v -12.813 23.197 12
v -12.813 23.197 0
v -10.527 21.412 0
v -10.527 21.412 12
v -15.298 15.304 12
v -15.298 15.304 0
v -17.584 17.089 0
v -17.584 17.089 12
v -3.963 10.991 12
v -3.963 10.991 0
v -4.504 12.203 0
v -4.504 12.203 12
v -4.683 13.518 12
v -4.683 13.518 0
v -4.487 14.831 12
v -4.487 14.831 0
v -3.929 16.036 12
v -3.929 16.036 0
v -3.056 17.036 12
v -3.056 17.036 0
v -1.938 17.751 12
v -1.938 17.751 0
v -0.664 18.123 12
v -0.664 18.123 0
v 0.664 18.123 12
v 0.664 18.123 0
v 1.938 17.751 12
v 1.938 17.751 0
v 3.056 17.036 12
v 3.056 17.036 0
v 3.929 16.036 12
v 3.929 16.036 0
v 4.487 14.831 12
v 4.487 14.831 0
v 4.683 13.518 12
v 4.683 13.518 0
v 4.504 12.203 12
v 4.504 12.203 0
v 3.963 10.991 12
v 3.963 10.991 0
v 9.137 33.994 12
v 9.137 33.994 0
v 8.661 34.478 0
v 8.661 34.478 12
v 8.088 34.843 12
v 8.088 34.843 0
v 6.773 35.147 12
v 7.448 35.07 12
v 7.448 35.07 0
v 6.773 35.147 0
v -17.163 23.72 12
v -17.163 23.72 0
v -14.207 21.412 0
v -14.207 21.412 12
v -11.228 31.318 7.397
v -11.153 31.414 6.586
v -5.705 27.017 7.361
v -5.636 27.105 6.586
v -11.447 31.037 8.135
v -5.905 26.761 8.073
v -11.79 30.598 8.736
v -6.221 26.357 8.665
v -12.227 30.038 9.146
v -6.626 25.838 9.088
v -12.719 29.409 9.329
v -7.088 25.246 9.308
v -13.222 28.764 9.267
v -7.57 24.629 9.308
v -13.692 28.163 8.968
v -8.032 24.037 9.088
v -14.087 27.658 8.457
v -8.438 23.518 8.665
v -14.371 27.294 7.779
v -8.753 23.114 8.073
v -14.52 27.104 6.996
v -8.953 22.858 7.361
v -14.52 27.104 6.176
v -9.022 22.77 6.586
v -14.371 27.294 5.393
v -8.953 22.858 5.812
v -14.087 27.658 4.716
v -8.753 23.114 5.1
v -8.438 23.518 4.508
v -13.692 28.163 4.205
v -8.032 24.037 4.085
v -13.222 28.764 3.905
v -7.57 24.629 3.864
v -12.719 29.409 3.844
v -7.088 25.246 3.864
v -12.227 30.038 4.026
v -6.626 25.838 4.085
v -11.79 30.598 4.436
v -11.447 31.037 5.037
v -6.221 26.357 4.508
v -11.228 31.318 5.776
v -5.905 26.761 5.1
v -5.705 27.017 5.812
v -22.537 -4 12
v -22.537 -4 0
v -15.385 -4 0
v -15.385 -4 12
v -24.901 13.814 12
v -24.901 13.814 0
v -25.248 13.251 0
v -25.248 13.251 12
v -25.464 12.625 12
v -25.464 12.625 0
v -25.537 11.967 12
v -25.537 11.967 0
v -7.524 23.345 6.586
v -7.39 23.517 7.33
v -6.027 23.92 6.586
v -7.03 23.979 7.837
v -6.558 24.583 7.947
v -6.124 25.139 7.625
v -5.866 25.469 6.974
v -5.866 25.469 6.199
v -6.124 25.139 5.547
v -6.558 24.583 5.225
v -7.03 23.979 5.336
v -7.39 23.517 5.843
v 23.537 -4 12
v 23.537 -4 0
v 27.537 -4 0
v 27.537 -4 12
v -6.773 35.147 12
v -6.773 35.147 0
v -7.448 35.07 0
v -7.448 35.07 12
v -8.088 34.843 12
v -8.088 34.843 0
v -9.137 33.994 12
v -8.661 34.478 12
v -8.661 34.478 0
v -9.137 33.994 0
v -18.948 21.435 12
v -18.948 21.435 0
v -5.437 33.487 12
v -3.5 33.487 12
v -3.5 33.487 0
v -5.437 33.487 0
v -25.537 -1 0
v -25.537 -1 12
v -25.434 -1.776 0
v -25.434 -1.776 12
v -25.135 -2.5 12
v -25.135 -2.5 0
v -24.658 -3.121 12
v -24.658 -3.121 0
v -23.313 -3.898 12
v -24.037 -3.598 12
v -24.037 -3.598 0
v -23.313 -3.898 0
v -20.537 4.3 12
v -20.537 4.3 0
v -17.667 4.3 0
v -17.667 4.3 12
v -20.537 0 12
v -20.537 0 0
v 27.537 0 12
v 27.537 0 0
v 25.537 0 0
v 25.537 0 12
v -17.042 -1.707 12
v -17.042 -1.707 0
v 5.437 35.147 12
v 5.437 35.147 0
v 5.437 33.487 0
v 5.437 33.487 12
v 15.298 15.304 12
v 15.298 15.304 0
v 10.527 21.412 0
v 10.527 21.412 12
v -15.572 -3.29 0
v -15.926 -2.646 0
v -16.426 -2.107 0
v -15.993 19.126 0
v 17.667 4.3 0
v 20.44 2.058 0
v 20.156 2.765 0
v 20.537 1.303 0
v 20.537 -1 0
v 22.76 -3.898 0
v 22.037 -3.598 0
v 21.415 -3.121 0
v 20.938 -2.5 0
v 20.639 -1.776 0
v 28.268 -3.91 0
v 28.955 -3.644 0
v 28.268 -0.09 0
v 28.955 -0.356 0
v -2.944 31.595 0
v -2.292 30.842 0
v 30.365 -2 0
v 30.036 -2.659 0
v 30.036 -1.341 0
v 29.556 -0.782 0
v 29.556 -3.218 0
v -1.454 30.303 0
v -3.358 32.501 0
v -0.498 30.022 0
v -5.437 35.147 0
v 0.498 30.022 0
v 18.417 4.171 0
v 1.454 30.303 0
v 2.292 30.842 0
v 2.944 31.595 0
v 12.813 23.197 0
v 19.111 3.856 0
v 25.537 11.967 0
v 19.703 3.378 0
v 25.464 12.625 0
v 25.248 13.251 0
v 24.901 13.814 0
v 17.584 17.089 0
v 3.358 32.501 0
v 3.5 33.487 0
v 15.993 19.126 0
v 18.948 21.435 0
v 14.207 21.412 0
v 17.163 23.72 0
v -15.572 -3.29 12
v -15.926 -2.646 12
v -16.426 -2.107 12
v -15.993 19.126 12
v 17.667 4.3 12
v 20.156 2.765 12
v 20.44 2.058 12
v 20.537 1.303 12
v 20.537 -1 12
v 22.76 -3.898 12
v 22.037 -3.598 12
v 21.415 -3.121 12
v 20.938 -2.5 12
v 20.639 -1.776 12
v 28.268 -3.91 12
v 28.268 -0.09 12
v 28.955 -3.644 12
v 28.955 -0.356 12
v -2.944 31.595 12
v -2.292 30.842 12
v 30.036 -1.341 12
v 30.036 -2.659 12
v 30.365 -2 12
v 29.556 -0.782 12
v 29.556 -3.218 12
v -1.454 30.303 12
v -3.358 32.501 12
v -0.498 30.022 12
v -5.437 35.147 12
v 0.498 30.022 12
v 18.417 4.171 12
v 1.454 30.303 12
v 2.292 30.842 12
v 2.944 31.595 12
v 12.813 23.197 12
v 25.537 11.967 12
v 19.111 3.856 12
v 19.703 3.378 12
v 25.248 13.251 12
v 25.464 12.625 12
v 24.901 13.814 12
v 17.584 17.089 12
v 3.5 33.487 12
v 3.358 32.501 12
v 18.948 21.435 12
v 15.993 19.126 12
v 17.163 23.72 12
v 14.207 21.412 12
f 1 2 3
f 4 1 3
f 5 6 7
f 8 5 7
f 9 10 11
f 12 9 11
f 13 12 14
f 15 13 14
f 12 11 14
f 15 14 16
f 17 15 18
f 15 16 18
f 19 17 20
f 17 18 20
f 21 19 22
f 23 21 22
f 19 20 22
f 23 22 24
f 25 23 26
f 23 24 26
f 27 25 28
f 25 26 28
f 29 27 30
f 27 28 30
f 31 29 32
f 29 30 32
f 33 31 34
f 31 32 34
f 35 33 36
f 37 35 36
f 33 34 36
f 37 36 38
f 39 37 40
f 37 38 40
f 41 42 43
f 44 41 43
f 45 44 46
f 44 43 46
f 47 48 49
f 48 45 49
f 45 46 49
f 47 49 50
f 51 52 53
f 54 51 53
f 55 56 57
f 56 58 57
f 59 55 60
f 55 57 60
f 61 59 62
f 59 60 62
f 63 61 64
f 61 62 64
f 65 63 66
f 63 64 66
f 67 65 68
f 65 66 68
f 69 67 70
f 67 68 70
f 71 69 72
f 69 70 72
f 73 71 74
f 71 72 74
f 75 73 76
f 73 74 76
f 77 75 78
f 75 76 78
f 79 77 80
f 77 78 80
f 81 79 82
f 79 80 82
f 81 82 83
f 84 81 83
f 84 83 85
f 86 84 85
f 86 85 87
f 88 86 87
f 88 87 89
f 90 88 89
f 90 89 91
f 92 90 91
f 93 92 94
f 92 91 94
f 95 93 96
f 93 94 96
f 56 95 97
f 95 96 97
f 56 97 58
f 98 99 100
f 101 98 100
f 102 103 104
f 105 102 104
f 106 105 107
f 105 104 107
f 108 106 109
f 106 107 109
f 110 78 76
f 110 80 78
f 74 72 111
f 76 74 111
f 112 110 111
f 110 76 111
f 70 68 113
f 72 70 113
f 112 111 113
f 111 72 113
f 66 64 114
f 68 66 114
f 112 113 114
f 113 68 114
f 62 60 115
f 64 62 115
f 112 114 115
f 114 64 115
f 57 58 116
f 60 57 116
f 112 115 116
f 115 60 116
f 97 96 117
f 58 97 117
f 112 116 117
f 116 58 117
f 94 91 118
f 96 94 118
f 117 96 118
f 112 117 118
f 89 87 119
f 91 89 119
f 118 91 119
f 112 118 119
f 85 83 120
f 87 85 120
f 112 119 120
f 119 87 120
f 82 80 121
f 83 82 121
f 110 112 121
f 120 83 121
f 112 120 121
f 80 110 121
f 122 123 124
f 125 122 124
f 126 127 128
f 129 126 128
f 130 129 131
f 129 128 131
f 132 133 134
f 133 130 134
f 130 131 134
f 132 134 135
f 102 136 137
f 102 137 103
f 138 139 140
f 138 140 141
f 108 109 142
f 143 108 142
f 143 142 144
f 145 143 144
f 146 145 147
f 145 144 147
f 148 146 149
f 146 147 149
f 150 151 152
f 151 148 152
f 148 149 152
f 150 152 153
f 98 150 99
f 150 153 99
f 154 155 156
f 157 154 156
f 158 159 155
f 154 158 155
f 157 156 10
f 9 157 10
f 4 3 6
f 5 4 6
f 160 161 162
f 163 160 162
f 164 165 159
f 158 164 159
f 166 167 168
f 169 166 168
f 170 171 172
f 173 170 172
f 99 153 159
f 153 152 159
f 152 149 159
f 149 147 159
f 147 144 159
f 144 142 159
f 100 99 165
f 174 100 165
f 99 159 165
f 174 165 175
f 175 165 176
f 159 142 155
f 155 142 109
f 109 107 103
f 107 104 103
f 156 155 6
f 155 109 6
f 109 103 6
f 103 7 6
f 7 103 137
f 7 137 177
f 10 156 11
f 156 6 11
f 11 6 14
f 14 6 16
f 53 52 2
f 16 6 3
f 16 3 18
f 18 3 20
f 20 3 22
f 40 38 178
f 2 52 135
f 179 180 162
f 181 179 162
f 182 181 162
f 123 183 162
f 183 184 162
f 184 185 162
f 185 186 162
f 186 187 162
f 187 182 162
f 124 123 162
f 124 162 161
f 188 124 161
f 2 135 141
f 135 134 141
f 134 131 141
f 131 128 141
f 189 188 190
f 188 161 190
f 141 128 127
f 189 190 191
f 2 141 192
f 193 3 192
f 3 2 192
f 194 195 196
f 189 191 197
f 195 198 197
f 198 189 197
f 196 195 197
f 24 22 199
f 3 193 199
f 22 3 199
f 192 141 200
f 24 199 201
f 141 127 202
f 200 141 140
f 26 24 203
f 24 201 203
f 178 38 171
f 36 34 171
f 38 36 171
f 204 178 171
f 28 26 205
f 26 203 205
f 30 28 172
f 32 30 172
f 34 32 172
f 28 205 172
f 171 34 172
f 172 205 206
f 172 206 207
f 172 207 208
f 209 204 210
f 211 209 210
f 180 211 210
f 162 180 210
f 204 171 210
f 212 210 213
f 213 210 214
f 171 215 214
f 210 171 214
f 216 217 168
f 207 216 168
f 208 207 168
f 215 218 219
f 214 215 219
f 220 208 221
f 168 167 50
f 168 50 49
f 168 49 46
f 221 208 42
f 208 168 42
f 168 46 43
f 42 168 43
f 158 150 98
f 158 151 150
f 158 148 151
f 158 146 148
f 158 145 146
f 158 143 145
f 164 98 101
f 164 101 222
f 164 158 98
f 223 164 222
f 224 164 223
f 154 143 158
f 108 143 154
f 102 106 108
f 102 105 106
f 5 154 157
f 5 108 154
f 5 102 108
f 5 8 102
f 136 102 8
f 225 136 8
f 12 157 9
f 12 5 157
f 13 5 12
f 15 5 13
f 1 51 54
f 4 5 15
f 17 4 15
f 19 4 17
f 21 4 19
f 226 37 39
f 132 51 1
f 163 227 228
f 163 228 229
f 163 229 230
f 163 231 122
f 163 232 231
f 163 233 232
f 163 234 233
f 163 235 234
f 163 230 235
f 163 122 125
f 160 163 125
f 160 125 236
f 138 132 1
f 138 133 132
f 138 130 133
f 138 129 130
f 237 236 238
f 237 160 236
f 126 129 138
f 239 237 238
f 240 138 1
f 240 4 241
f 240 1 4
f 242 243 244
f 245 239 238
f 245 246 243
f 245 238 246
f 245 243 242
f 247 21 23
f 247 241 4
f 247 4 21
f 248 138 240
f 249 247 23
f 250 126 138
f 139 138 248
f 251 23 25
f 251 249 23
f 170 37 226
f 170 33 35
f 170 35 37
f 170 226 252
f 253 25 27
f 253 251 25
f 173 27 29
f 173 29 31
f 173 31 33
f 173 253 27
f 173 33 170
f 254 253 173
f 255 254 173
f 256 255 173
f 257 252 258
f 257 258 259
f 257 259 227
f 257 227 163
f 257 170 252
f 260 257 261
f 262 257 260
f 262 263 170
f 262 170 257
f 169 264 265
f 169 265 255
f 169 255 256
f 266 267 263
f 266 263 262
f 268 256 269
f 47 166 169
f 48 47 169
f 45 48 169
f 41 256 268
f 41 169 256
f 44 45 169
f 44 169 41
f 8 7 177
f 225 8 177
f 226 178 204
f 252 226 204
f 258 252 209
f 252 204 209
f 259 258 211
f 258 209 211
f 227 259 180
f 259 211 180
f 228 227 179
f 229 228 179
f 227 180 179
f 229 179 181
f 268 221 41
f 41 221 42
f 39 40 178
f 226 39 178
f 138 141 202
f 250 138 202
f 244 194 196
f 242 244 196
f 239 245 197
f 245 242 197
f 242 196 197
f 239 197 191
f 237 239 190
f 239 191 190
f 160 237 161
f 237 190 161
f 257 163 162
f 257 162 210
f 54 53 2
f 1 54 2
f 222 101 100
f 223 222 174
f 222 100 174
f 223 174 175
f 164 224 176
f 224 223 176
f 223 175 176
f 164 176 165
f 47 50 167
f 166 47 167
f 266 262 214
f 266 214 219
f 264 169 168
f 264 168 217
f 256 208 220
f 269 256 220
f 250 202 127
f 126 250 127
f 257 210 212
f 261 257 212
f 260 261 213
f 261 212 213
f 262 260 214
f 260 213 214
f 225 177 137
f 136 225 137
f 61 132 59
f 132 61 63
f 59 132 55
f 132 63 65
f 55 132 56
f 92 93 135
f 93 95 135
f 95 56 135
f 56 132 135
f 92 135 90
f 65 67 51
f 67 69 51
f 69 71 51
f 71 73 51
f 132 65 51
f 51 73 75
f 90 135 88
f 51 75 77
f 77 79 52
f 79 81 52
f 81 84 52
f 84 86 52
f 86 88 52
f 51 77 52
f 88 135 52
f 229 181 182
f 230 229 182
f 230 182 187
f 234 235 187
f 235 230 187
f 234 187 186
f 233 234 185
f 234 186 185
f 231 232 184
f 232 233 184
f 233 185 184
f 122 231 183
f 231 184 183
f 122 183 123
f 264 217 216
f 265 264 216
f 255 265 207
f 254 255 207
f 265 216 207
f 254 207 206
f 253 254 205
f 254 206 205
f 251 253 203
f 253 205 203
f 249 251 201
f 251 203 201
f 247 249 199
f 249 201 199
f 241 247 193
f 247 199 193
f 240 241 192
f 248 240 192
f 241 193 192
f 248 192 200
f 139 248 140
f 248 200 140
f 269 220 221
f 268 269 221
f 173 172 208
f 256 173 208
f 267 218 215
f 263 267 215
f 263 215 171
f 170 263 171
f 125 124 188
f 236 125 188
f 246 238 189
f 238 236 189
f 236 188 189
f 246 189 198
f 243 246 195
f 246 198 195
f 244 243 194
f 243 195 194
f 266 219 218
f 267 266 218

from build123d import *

# Parameters (mm, degrees)
F1_DEPTH    = 12
F3_D        = 5.5
F3_DEPTH    = 7
F3_TIP      = 1.6523667023
F4_T1_DEPTH = 12
F4_T3_DEPTH = 27
F4_T5_DEPTH = 17.1641728771
F4_T7_DEPTH = 19.3168092608
F4_T9_DEPTH = 21.2169428411


# Not quite as in the source:
# - a fillet or chamfer that OpenCascade refuses, or shapes differently, is made with other operations: its cross-section is extruded or revolved along the edge and cut away or added
# - a feature names something its author has since deleted; it is built from what else it names


with BuildPart() as f1:
    # F0 (on Top) → F1 (new body)
    with BuildSketch(Plane.XY):
        with BuildLine():
            Line((5.4365318258, 35.1470746964), (5.4365318258, 33.4868409083))
            Line((5.4365318258, 33.4868409083), (3.5, 33.4868409083))
            ThreePointArc((3.5, 33.4868409083), (0, 29.9868409083), (-3.5, 33.4868409083))
            Line((-3.5, 33.4868409083), (-5.4365318258, 33.4868409083))
            Line((-5.4365318258, 33.4868409083), (-5.4365318258, 35.1470746964))
            Line((-5.4365318258, 35.1470746964), (-8.2365318258, 35.1470746964))
            Line((-8.2365318258, 35.1470746964), (-17.1626134825, 23.7201299491))
            Line((-17.1626134825, 23.7201299491), (-14.2073691514, 21.4116605551))
            Line((-14.2073691514, 21.4116605551), (-12.8128593238, 23.1968768865))
            Line((-12.8128593238, 23.1968768865), (-10.5274703744, 21.4116605551))
            Line((-10.5274703744, 21.4116605551), (-15.298307122, 15.304155604))
            Line((-15.298307122, 15.304155604), (-17.5836960714, 17.0893719354))
            Line((-17.5836960714, 17.0893719354), (-15.9925854827, 19.1262716057))
            Line((-15.9925854827, 19.1262716057), (-18.9478298139, 21.4347409997))
            Line((-18.9478298139, 21.4347409997), (-25.5365714751, 13))
            Line((-25.5365714751, 13), (-25.5365714751, 0))
            Line((-25.5365714751, 0), (-25.5365714751, -4))
            Line((-25.5365714751, -4), (-20.5365714751, -4))
            Line((-20.5365714751, -4), (-15.3852878138, -4))
            Line((-15.3852878138, -4), (-15.3852878138, -2.5156375486))
            Line((-15.3852878138, -2.5156375486), (-20.5365714751, 0))
            Line((-20.5365714751, 0), (-20.5365714751, 4.3))
            Line((-20.5365714751, 4.3), (-17.6668407531, 4.3))
            Line((-17.6668407531, 4.3), (-3.9629505379, 10.990731871))
            ThreePointArc((-3.9629505379, 10.990731871), (0, 18.1703798791), (3.9629505379, 10.990731871))
            Line((3.9629505379, 10.990731871), (17.6668407531, 4.3))
            Line((17.6668407531, 4.3), (20.5365714751, 4.3))
            Line((20.5365714751, 4.3), (20.5365714751, -4))
            Line((20.5365714751, -4), (30.5365714751, -4))
            Line((30.5365714751, -4), (30.5365714751, 0))
            Line((30.5365714751, 0), (25.5365714751, 0))
            Line((25.5365714751, 0), (25.5365714751, 13))
            Line((25.5365714751, 13), (18.9478298139, 21.4347409997))
            Line((18.9478298139, 21.4347409997), (15.9925854827, 19.1262716057))
            Line((15.9925854827, 19.1262716057), (17.5836960714, 17.0893719354))
            Line((17.5836960714, 17.0893719354), (15.298307122, 15.304155604))
            Line((15.298307122, 15.304155604), (10.5274703744, 21.4116605551))
            Line((10.5274703744, 21.4116605551), (12.8128593238, 23.1968768865))
            Line((12.8128593238, 23.1968768865), (14.2073691514, 21.4116605551))
            Line((14.2073691514, 21.4116605551), (17.1626134825, 23.7201299491))
            Line((17.1626134825, 23.7201299491), (8.2365318258, 35.1470746964))
            Line((8.2365318258, 35.1470746964), (5.4365318258, 35.1470746964))
        make_face()
    extrude(amount=F1_DEPTH)

    # F3
    with Locations(Plane(origin=(-22.1660473582, 17.3148600175, 0), x_dir=(-0.6155918384, -0.788065155, 0), z_dir=(-0.788065155, 0.6155918384, 0))):
        with Locations((-15.1406489313, 6.5862988122)):
            Hole(F3_D / 2, depth=F3_DEPTH)
            with Locations((0, 0, -(F3_DEPTH + F3_TIP / 2))):  # 118° drill point
                Cone(0, F3_D / 2, F3_TIP, mode=Mode.SUBTRACT)

    # F4: fillet of radius 3 on 10 edges, made by hand

    # F4_s2 → F4_t1 (join)
    with BuildSketch(Plane.XY):
        with BuildLine():
            ThreePointArc((17.6668407531, 4.3), (19.7034595472, 3.3775817354), (20.5365714751, 1.302829682))
            Line((20.5365714751, 1.302829682), (20.5365714751, 4.3))
            Line((20.5365714751, 4.3), (17.6668407531, 4.3))
        make_face()
    extrude(amount=F4_T1_DEPTH)

    # F4_s4 → F4_t3 (cut)
    with BuildSketch(Plane.XY.offset(-7.5)):
        with BuildLine():
            ThreePointArc((20.5365714751, -1), (21.4152511315, -3.1213203436), (23.5365714751, -4))
            Line((23.5365714751, -4), (20.5365714751, -4))
            Line((20.5365714751, -4), (20.5365714751, -1))
        make_face()
        with BuildLine():
            ThreePointArc((-25.5365714751, -1), (-24.6578918186, -3.1213203436), (-22.5365714751, -4))
            Line((-22.5365714751, -4), (-25.5365714751, -4))
            Line((-25.5365714751, -4), (-25.5365714751, -1))
        make_face()
        with BuildLine():
            ThreePointArc((30.5365714751, -3), (29.6578918186, -0.8786796564), (27.5365714751, 0))
            Line((27.5365714751, 0), (30.5365714751, 0))
            Line((30.5365714751, 0), (30.5365714751, -3))
        make_face()
        with BuildLine():
            ThreePointArc((27.5365714751, -4), (29.6578918186, -3.1213203436), (30.5365714751, -1))
            Line((30.5365714751, -1), (30.5365714751, -4))
            Line((30.5365714751, -4), (27.5365714751, -4))
        make_face()
    extrude(amount=F4_T3_DEPTH, mode=Mode.SUBTRACT)

    # F4_s6 → F4_t5 (cut)
    with BuildSketch(Plane.XY.offset(-2.5820864386)):
        with BuildLine():
            ThreePointArc((25.5365714751, 11.9671654246), (25.3731703536, 12.9437445573), (24.90076694, 13.8139409398))
            Line((24.90076694, 13.8139409398), (25.5365714751, 13))
            Line((25.5365714751, 13), (25.5365714751, 11.9671654246))
        make_face()
        with BuildLine():
            ThreePointArc((-24.90076694, 13.8139409398), (-25.3731703536, 12.9437445573), (-25.5365714751, 11.9671654246))
            Line((-25.5365714751, 11.9671654246), (-25.5365714751, 13))
            Line((-25.5365714751, 13), (-24.90076694, 13.8139409398))
        make_face()
    extrude(amount=F4_T5_DEPTH, mode=Mode.SUBTRACT)

    # F4_s8 → F4_t7 (cut)
    with BuildSketch(Plane.XY.offset(-3.6584046304)):
        with BuildLine():
            ThreePointArc((9.1373654386, 33.9938502116), (8.088402549, 34.843398726), (6.7731699737, 35.1470746964))
            Line((6.7731699737, 35.1470746964), (8.2365318258, 35.1470746964))
            Line((8.2365318258, 35.1470746964), (9.1373654386, 33.9938502116))
        make_face()
        with BuildLine():
            ThreePointArc((-6.7731699737, 35.1470746964), (-8.088402549, 34.843398726), (-9.1373654386, 33.9938502116))
            Line((-9.1373654386, 33.9938502116), (-8.2365318258, 35.1470746964))
            Line((-8.2365318258, 35.1470746964), (-6.7731699737, 35.1470746964))
        make_face()
    extrude(amount=F4_T7_DEPTH, mode=Mode.SUBTRACT)

    # F4_s10 → F4_t9 (cut)
    with BuildSketch(Plane.XY.offset(-4.6084714206)):
        with BuildLine():
            ThreePointArc((-15.3852878138, -4), (-15.9262171402, -2.6458583956), (-17.0417102945, -1.7067210022))
            Line((-17.0417102945, -1.7067210022), (-15.3852878138, -2.5156375486))
            Line((-15.3852878138, -2.5156375486), (-15.3852878138, -4))
        make_face()
    extrude(amount=F4_T9_DEPTH, mode=Mode.SUBTRACT)


solid = f1.part
